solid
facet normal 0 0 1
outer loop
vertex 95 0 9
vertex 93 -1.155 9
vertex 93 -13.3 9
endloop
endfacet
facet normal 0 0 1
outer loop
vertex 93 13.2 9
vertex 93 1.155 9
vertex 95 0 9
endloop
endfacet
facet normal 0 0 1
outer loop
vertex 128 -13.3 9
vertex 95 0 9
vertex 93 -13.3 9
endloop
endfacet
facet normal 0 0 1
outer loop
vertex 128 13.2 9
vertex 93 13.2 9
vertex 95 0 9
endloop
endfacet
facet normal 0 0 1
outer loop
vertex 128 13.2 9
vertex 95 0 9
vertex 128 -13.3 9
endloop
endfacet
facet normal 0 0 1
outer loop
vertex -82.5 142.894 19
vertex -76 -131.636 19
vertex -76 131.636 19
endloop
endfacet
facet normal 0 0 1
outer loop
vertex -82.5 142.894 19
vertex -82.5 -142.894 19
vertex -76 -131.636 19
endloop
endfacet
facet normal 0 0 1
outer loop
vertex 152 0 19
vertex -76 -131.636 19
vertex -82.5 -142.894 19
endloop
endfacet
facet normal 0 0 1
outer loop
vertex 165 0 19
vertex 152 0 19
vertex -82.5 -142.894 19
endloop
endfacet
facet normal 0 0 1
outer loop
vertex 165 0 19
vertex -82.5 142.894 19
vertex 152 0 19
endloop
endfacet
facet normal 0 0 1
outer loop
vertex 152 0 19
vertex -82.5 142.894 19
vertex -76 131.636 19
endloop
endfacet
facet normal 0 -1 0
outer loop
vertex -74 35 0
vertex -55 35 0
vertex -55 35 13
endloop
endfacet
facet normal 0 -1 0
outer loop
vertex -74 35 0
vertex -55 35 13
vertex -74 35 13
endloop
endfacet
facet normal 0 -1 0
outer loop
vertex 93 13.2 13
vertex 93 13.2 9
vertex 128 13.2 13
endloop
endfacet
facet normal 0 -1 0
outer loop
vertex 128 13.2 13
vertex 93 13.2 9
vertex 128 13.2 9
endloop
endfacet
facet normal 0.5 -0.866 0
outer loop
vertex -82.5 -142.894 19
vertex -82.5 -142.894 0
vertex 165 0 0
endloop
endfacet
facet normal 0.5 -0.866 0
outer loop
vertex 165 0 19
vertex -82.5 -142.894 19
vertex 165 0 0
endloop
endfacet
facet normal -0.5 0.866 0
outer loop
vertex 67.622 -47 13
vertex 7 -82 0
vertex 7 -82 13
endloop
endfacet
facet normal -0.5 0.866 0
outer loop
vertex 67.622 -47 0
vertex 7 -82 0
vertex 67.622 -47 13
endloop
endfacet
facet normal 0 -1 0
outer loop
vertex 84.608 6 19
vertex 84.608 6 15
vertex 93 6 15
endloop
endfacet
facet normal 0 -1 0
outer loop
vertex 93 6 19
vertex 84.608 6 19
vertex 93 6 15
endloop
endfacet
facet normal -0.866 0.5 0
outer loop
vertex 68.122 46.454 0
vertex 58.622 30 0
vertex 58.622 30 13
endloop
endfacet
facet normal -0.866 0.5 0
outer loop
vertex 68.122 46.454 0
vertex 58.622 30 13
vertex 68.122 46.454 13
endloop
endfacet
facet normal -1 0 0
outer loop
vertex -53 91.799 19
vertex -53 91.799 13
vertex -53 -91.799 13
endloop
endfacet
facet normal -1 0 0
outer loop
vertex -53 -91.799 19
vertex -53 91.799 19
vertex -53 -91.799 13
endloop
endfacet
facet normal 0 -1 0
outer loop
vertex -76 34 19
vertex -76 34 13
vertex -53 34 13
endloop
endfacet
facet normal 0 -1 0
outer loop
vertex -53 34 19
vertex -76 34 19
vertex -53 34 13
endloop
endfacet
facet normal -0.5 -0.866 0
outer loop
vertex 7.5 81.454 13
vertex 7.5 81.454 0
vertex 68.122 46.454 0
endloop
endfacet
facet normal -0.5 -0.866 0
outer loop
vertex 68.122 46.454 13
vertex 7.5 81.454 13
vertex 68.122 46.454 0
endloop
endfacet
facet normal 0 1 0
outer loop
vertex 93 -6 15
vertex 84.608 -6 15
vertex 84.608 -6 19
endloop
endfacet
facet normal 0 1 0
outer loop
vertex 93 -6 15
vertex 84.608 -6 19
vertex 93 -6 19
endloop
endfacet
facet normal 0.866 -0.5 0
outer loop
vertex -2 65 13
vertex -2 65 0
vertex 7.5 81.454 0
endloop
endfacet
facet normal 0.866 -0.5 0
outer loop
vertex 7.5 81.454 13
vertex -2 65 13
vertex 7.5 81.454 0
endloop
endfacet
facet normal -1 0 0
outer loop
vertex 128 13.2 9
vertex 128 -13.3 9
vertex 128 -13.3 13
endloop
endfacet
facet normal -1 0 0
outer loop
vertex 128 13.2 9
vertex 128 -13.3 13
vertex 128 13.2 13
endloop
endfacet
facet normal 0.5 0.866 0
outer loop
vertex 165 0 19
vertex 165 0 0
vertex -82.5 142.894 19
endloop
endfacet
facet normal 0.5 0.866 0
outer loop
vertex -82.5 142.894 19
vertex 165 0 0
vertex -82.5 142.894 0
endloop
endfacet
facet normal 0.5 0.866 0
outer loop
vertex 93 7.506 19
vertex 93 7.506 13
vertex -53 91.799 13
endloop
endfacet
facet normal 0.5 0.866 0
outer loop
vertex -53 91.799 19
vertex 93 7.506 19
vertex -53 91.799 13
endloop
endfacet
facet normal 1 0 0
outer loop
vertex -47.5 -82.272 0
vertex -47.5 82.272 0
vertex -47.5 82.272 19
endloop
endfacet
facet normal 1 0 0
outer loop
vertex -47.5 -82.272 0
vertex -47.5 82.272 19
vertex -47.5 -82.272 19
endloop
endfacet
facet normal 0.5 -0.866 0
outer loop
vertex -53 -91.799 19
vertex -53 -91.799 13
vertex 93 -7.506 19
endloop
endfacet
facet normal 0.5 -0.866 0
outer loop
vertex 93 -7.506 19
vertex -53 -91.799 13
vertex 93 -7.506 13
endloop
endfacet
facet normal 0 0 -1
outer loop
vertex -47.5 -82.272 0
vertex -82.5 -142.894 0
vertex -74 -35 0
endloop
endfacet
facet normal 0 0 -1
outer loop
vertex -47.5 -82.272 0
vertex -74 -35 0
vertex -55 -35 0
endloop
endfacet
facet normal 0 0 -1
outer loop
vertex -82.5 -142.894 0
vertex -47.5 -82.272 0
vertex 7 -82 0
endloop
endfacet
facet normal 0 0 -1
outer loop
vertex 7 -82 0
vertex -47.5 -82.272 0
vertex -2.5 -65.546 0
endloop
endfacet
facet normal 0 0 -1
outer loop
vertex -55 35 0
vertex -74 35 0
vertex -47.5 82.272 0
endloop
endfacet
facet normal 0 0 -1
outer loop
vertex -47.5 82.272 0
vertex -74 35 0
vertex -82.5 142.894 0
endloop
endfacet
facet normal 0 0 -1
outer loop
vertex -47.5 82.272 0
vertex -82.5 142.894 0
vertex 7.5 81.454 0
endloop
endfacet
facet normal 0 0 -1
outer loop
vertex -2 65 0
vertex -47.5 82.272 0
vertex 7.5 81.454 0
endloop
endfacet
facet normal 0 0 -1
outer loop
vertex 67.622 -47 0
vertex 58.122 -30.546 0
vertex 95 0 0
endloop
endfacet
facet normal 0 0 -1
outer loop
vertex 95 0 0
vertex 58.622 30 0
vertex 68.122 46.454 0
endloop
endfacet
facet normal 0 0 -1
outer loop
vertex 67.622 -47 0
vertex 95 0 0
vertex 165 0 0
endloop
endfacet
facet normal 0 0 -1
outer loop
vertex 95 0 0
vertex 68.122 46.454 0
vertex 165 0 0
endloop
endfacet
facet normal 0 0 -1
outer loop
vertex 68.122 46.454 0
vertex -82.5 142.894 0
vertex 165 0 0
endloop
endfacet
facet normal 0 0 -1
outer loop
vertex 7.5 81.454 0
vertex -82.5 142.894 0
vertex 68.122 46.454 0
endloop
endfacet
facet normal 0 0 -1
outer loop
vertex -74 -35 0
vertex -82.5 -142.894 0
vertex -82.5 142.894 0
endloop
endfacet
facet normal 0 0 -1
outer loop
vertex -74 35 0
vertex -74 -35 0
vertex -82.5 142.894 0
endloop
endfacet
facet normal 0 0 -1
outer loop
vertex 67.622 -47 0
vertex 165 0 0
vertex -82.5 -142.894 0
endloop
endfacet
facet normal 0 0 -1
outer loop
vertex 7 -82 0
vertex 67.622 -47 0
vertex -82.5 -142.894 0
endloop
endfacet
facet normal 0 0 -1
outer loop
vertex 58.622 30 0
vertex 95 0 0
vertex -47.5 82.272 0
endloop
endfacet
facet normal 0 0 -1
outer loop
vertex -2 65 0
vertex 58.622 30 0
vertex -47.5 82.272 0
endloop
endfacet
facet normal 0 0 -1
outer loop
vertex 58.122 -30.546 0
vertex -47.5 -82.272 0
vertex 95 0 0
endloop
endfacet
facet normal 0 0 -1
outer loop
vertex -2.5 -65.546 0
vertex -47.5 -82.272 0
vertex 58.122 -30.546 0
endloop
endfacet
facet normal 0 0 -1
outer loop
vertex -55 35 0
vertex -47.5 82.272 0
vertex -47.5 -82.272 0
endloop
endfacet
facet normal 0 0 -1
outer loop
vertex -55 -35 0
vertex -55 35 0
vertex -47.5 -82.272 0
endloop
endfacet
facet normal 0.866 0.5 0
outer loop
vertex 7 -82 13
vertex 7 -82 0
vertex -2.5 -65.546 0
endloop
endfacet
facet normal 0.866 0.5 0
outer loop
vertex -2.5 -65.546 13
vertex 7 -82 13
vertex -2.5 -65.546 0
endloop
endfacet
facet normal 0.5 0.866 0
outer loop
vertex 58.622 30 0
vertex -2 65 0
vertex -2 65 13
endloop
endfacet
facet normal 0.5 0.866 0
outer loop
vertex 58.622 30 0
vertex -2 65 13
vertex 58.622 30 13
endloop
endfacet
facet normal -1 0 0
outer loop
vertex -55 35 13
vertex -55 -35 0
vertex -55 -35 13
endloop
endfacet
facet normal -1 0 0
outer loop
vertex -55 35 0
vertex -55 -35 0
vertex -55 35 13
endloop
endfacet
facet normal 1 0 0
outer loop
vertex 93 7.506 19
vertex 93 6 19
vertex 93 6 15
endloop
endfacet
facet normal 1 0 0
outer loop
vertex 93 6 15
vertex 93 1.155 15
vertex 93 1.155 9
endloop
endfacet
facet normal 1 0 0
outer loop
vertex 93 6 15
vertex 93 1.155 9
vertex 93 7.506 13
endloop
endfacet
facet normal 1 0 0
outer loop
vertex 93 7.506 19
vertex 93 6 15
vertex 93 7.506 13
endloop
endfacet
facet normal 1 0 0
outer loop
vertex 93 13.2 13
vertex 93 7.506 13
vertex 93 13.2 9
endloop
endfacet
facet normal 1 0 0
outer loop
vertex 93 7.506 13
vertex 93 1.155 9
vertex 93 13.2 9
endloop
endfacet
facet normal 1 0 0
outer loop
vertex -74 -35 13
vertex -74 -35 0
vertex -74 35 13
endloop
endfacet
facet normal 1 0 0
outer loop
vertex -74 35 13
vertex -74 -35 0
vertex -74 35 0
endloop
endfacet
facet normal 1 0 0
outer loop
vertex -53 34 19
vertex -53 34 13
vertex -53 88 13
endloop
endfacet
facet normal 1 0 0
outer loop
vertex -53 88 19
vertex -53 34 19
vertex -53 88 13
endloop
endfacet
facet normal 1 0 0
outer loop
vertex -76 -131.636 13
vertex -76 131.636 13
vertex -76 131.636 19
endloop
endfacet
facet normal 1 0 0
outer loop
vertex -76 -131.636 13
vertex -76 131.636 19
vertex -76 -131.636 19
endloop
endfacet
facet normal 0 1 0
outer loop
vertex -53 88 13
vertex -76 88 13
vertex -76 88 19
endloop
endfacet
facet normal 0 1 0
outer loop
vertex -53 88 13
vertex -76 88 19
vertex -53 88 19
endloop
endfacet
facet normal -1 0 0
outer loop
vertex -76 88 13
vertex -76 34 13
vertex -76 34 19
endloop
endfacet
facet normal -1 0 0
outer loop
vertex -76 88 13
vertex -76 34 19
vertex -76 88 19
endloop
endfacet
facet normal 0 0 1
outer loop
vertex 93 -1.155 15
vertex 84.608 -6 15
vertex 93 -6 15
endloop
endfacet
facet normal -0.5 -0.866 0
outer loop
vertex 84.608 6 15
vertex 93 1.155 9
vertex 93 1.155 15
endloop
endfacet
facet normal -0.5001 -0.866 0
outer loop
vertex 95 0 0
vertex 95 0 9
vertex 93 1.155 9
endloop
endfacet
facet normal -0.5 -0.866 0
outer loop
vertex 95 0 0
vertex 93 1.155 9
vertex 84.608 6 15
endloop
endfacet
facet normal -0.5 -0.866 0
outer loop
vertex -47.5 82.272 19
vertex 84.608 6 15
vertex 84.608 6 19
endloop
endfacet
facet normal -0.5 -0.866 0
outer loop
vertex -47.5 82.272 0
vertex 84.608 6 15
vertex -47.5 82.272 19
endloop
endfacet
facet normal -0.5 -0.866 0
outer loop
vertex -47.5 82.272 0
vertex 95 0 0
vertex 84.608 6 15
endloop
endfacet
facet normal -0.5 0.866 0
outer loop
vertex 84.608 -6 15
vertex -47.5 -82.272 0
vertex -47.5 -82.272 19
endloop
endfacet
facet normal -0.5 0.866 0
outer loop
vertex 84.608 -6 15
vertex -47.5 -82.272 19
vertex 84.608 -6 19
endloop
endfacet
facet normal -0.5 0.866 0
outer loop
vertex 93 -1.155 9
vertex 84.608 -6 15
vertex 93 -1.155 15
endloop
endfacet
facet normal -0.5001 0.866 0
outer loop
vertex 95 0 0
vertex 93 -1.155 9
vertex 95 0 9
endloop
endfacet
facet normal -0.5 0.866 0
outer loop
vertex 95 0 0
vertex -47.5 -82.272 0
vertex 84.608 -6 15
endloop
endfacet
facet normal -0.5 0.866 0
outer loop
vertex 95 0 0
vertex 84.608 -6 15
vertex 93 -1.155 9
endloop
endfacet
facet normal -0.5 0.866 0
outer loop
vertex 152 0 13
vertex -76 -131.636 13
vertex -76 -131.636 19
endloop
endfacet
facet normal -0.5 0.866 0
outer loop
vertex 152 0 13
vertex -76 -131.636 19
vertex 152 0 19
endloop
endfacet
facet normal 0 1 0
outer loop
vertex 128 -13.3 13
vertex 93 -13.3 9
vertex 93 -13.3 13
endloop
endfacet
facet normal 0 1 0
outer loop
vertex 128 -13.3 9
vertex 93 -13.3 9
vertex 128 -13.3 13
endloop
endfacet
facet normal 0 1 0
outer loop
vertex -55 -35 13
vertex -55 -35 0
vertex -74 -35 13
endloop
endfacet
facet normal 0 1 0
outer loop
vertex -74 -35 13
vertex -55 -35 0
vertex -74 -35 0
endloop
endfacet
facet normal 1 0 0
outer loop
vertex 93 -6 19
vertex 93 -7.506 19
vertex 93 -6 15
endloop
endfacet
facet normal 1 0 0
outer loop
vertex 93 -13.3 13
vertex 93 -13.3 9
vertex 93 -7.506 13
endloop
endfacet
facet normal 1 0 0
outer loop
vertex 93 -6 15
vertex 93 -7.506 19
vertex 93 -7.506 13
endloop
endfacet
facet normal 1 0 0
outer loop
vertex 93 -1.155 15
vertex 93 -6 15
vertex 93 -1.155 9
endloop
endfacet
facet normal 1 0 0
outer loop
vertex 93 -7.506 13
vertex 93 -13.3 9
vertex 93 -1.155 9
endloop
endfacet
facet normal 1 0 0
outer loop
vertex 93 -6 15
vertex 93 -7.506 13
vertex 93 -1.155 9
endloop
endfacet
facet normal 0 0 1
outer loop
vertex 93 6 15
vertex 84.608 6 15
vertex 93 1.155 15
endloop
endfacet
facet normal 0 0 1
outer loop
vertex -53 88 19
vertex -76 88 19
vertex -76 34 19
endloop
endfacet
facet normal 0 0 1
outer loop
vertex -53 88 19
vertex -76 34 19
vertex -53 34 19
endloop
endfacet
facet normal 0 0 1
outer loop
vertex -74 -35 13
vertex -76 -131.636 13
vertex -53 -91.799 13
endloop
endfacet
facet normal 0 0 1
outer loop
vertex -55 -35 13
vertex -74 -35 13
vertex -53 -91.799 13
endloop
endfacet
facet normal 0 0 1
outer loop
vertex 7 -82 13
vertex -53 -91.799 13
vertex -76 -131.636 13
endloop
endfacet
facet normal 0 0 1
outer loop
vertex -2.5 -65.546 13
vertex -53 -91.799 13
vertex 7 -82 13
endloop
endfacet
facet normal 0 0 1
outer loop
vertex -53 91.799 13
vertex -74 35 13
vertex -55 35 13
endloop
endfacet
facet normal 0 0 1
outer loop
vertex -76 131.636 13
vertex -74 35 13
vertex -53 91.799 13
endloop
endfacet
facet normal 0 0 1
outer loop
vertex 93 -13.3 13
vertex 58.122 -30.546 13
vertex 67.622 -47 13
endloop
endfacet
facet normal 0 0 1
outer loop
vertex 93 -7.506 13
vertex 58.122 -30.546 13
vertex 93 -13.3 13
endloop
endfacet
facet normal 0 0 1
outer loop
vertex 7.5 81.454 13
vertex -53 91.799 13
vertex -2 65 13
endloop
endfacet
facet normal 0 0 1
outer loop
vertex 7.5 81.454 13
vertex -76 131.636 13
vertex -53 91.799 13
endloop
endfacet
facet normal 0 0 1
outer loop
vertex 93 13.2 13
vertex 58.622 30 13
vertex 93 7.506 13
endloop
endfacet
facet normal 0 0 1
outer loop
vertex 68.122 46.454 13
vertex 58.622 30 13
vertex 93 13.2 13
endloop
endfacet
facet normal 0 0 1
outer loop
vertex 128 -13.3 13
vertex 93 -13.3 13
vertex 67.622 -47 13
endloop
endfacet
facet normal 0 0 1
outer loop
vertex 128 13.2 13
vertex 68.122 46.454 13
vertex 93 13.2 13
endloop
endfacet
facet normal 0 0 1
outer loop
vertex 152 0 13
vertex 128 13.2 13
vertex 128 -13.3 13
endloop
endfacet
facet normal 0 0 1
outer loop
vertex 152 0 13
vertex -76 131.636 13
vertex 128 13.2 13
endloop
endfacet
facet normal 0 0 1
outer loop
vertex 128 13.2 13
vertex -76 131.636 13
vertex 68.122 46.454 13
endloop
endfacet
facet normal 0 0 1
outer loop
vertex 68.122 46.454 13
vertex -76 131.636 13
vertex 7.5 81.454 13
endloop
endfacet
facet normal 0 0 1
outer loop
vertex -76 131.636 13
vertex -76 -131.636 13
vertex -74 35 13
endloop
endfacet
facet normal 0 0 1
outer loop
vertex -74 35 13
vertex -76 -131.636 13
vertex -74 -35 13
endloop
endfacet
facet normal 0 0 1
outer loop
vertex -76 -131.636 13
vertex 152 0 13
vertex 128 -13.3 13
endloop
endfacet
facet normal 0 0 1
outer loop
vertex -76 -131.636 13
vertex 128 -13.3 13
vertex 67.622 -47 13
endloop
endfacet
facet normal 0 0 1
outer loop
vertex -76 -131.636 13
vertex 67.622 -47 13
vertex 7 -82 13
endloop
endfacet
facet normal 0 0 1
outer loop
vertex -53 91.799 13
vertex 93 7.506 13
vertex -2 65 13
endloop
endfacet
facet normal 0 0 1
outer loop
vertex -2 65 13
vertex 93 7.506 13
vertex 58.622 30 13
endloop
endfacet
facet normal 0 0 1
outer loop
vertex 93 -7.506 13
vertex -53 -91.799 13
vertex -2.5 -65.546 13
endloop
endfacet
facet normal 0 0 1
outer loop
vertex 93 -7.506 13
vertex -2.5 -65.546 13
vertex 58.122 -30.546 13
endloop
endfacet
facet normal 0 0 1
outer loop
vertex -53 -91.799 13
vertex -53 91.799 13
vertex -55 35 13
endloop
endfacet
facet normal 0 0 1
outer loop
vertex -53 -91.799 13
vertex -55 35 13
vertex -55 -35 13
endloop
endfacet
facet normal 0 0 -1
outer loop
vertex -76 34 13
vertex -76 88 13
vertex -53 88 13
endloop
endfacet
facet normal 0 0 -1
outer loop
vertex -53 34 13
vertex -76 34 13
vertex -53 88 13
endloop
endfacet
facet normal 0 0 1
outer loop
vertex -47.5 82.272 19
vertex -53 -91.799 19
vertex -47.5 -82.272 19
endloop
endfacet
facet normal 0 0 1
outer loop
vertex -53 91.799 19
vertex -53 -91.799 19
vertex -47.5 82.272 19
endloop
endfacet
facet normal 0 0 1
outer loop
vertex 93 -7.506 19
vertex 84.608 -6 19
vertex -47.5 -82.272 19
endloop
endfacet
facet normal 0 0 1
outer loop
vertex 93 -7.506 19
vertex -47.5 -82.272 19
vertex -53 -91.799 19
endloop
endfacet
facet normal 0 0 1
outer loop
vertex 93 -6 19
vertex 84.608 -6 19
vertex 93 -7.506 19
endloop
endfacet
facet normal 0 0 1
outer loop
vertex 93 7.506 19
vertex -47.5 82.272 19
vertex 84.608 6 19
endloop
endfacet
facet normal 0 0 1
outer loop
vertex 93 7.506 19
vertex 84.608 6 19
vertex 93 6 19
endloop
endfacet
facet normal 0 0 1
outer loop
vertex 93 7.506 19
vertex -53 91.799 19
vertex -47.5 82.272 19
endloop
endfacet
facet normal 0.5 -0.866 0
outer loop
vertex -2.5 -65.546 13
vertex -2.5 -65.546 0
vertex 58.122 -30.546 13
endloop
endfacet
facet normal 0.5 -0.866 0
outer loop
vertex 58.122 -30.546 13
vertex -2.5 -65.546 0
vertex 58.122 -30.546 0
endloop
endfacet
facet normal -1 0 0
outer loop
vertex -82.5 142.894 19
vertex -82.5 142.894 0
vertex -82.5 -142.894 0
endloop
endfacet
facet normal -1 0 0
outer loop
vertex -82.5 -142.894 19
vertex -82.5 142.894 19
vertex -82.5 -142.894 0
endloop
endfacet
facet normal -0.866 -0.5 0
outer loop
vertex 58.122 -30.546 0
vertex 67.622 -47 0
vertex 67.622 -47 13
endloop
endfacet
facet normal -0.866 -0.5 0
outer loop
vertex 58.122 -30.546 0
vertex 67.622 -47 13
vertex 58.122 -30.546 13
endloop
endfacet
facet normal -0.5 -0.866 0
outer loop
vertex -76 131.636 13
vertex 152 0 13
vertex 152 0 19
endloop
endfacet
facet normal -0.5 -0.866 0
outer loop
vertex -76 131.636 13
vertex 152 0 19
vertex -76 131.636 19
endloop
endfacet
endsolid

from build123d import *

# Parameters (mm, degrees)
BOX005_W               = 23
BOX005_H               = 54
BOX005_DEPTH           = 6
PRISM003_DEPTH         = 6
PRISM002_DEPTH         = 6
BOX004_W               = 10
BOX004_H               = 12
BOX004_DEPTH           = 4
BOX003_W               = 35
BOX003_H               = 26.5
BOX003_DEPTH           = 10
BOX002_W               = 70
BOX002_H               = 19
BOX002_DEPTH           = 19
BOX002_PLACEMENT_ANGLE = 30
BOX001_W               = 70
BOX001_H               = 19
BOX001_DEPTH           = 19
BOX001_PLACEMENT_ANGLE = 90
BOX_W                  = 70
BOX_H                  = 19
BOX_DEPTH              = 19
BOX_PLACEMENT_ANGLE    = 30
PRISM001_DEPTH         = 19
PRISM_DEPTH            = 19


with BuildPart() as box005:
    # Box005 → Box005 (new body)
    with BuildSketch(Plane(origin=(-76, 34, 13), x_dir=(1, 0, 0), z_dir=(0, 0, 1))):
        with Locations((11.5, 27)):
            Rectangle(BOX005_W, BOX005_H)
    extrude(amount=BOX005_DEPTH)


with BuildPart() as prism003:
    # Prism003 → Prism003 (new body)
    with BuildSketch(Plane.XY.offset(13)):
        Polygon((106, 0), (-53, 91.798693), (-53, -91.798693), align=None)
    extrude(amount=PRISM003_DEPTH)


with BuildPart() as cut006:
    # Prism002 → Prism002 (new body)
    with BuildSketch(Plane.XY.offset(13)):
        Polygon((152, 0), (-76, 131.635861), (-76, -131.635861), align=None)
    extrude(amount=PRISM002_DEPTH)

    # Cut006: cut Prism003
    add(prism003.part, mode=Mode.SUBTRACT)


with BuildPart() as box004:
    # Box004 → Box004 (new body)
    with BuildSketch(Plane(origin=(84, -6, 15), x_dir=(1, 0, 0), z_dir=(0, 0, 1))):
        with Locations((5, 6)):
            Rectangle(BOX004_W, BOX004_H)
    extrude(amount=BOX004_DEPTH)


with BuildPart() as box003:
    # Box003 → Box003 (new body)
    with BuildSketch(Plane(origin=(93, -13.3, 9), x_dir=(1, 0, 0), z_dir=(0, 0, 1))):
        with Locations((17.5, 13.25)):
            Rectangle(BOX003_W, BOX003_H)
    extrude(amount=BOX003_DEPTH)


with BuildPart() as box002:
    # Box002 → Box002 (new body)
    with BuildSketch(Plane.XY):
        with Locations((35, 9.5)):
            Rectangle(BOX002_W, BOX002_H)
    extrude(amount=BOX002_DEPTH)


with BuildPart() as box002_1:
    # Box002 placement: moved
    add(box002.part.moved(Location((7, -82, 0))).rotate(Axis((7, -82, 0), (0, 0, 1)), BOX002_PLACEMENT_ANGLE))


with BuildPart() as box001:
    # Box001 → Box001 (new body)
    with BuildSketch(Plane.XY):
        with Locations((35, 9.5)):
            Rectangle(BOX001_W, BOX001_H)
    extrude(amount=BOX001_DEPTH)


with BuildPart() as box001_1:
    # Box001 placement: moved
    add(box001.part.moved(Location((-55, -35, 0))).rotate(Axis((-55, -35, 0), (0, 0, 1)), BOX001_PLACEMENT_ANGLE))


with BuildPart() as box:
    # Box → Box (new body)
    with BuildSketch(Plane.XY):
        with Locations((35, 9.5)):
            Rectangle(BOX_W, BOX_H)
    extrude(amount=BOX_DEPTH)


with BuildPart() as box_1:
    # Box placement: moved
    add(box.part.moved(Location((-2, 65, 0))).rotate(Axis((-2, 65, 0), (0, 0, -1)), BOX_PLACEMENT_ANGLE))


with BuildPart() as prism001:
    # Prism001 → Prism001 (new body)
    with BuildSketch(Plane.XY):
        Polygon((95, 0), (-47.5, 82.272413), (-47.5, -82.272413), align=None)
    extrude(amount=PRISM001_DEPTH)


with BuildPart() as cut007:
    # Prism → Prism (new body)
    with BuildSketch(Plane.XY):
        Polygon((165, 0), (-82.5, 142.894192), (-82.5, -142.894192), align=None)
    extrude(amount=PRISM_DEPTH)

    # Cut: cut Prism001
    add(prism001.part, mode=Mode.SUBTRACT)

    # Cut001: cut Box
    add(box_1.part, mode=Mode.SUBTRACT)

    # Cut002: cut Box001
    add(box001_1.part, mode=Mode.SUBTRACT)

    # Cut003: cut Box002
    add(box002_1.part, mode=Mode.SUBTRACT)

    # Cut004: cut Box003
    add(box003.part, mode=Mode.SUBTRACT)

    # Cut005: cut Box004
    add(box004.part, mode=Mode.SUBTRACT)

    # Cut007: cut Cut006
    add(cut006.part, mode=Mode.SUBTRACT)


solid = Compound([box005.part, cut007.part])
